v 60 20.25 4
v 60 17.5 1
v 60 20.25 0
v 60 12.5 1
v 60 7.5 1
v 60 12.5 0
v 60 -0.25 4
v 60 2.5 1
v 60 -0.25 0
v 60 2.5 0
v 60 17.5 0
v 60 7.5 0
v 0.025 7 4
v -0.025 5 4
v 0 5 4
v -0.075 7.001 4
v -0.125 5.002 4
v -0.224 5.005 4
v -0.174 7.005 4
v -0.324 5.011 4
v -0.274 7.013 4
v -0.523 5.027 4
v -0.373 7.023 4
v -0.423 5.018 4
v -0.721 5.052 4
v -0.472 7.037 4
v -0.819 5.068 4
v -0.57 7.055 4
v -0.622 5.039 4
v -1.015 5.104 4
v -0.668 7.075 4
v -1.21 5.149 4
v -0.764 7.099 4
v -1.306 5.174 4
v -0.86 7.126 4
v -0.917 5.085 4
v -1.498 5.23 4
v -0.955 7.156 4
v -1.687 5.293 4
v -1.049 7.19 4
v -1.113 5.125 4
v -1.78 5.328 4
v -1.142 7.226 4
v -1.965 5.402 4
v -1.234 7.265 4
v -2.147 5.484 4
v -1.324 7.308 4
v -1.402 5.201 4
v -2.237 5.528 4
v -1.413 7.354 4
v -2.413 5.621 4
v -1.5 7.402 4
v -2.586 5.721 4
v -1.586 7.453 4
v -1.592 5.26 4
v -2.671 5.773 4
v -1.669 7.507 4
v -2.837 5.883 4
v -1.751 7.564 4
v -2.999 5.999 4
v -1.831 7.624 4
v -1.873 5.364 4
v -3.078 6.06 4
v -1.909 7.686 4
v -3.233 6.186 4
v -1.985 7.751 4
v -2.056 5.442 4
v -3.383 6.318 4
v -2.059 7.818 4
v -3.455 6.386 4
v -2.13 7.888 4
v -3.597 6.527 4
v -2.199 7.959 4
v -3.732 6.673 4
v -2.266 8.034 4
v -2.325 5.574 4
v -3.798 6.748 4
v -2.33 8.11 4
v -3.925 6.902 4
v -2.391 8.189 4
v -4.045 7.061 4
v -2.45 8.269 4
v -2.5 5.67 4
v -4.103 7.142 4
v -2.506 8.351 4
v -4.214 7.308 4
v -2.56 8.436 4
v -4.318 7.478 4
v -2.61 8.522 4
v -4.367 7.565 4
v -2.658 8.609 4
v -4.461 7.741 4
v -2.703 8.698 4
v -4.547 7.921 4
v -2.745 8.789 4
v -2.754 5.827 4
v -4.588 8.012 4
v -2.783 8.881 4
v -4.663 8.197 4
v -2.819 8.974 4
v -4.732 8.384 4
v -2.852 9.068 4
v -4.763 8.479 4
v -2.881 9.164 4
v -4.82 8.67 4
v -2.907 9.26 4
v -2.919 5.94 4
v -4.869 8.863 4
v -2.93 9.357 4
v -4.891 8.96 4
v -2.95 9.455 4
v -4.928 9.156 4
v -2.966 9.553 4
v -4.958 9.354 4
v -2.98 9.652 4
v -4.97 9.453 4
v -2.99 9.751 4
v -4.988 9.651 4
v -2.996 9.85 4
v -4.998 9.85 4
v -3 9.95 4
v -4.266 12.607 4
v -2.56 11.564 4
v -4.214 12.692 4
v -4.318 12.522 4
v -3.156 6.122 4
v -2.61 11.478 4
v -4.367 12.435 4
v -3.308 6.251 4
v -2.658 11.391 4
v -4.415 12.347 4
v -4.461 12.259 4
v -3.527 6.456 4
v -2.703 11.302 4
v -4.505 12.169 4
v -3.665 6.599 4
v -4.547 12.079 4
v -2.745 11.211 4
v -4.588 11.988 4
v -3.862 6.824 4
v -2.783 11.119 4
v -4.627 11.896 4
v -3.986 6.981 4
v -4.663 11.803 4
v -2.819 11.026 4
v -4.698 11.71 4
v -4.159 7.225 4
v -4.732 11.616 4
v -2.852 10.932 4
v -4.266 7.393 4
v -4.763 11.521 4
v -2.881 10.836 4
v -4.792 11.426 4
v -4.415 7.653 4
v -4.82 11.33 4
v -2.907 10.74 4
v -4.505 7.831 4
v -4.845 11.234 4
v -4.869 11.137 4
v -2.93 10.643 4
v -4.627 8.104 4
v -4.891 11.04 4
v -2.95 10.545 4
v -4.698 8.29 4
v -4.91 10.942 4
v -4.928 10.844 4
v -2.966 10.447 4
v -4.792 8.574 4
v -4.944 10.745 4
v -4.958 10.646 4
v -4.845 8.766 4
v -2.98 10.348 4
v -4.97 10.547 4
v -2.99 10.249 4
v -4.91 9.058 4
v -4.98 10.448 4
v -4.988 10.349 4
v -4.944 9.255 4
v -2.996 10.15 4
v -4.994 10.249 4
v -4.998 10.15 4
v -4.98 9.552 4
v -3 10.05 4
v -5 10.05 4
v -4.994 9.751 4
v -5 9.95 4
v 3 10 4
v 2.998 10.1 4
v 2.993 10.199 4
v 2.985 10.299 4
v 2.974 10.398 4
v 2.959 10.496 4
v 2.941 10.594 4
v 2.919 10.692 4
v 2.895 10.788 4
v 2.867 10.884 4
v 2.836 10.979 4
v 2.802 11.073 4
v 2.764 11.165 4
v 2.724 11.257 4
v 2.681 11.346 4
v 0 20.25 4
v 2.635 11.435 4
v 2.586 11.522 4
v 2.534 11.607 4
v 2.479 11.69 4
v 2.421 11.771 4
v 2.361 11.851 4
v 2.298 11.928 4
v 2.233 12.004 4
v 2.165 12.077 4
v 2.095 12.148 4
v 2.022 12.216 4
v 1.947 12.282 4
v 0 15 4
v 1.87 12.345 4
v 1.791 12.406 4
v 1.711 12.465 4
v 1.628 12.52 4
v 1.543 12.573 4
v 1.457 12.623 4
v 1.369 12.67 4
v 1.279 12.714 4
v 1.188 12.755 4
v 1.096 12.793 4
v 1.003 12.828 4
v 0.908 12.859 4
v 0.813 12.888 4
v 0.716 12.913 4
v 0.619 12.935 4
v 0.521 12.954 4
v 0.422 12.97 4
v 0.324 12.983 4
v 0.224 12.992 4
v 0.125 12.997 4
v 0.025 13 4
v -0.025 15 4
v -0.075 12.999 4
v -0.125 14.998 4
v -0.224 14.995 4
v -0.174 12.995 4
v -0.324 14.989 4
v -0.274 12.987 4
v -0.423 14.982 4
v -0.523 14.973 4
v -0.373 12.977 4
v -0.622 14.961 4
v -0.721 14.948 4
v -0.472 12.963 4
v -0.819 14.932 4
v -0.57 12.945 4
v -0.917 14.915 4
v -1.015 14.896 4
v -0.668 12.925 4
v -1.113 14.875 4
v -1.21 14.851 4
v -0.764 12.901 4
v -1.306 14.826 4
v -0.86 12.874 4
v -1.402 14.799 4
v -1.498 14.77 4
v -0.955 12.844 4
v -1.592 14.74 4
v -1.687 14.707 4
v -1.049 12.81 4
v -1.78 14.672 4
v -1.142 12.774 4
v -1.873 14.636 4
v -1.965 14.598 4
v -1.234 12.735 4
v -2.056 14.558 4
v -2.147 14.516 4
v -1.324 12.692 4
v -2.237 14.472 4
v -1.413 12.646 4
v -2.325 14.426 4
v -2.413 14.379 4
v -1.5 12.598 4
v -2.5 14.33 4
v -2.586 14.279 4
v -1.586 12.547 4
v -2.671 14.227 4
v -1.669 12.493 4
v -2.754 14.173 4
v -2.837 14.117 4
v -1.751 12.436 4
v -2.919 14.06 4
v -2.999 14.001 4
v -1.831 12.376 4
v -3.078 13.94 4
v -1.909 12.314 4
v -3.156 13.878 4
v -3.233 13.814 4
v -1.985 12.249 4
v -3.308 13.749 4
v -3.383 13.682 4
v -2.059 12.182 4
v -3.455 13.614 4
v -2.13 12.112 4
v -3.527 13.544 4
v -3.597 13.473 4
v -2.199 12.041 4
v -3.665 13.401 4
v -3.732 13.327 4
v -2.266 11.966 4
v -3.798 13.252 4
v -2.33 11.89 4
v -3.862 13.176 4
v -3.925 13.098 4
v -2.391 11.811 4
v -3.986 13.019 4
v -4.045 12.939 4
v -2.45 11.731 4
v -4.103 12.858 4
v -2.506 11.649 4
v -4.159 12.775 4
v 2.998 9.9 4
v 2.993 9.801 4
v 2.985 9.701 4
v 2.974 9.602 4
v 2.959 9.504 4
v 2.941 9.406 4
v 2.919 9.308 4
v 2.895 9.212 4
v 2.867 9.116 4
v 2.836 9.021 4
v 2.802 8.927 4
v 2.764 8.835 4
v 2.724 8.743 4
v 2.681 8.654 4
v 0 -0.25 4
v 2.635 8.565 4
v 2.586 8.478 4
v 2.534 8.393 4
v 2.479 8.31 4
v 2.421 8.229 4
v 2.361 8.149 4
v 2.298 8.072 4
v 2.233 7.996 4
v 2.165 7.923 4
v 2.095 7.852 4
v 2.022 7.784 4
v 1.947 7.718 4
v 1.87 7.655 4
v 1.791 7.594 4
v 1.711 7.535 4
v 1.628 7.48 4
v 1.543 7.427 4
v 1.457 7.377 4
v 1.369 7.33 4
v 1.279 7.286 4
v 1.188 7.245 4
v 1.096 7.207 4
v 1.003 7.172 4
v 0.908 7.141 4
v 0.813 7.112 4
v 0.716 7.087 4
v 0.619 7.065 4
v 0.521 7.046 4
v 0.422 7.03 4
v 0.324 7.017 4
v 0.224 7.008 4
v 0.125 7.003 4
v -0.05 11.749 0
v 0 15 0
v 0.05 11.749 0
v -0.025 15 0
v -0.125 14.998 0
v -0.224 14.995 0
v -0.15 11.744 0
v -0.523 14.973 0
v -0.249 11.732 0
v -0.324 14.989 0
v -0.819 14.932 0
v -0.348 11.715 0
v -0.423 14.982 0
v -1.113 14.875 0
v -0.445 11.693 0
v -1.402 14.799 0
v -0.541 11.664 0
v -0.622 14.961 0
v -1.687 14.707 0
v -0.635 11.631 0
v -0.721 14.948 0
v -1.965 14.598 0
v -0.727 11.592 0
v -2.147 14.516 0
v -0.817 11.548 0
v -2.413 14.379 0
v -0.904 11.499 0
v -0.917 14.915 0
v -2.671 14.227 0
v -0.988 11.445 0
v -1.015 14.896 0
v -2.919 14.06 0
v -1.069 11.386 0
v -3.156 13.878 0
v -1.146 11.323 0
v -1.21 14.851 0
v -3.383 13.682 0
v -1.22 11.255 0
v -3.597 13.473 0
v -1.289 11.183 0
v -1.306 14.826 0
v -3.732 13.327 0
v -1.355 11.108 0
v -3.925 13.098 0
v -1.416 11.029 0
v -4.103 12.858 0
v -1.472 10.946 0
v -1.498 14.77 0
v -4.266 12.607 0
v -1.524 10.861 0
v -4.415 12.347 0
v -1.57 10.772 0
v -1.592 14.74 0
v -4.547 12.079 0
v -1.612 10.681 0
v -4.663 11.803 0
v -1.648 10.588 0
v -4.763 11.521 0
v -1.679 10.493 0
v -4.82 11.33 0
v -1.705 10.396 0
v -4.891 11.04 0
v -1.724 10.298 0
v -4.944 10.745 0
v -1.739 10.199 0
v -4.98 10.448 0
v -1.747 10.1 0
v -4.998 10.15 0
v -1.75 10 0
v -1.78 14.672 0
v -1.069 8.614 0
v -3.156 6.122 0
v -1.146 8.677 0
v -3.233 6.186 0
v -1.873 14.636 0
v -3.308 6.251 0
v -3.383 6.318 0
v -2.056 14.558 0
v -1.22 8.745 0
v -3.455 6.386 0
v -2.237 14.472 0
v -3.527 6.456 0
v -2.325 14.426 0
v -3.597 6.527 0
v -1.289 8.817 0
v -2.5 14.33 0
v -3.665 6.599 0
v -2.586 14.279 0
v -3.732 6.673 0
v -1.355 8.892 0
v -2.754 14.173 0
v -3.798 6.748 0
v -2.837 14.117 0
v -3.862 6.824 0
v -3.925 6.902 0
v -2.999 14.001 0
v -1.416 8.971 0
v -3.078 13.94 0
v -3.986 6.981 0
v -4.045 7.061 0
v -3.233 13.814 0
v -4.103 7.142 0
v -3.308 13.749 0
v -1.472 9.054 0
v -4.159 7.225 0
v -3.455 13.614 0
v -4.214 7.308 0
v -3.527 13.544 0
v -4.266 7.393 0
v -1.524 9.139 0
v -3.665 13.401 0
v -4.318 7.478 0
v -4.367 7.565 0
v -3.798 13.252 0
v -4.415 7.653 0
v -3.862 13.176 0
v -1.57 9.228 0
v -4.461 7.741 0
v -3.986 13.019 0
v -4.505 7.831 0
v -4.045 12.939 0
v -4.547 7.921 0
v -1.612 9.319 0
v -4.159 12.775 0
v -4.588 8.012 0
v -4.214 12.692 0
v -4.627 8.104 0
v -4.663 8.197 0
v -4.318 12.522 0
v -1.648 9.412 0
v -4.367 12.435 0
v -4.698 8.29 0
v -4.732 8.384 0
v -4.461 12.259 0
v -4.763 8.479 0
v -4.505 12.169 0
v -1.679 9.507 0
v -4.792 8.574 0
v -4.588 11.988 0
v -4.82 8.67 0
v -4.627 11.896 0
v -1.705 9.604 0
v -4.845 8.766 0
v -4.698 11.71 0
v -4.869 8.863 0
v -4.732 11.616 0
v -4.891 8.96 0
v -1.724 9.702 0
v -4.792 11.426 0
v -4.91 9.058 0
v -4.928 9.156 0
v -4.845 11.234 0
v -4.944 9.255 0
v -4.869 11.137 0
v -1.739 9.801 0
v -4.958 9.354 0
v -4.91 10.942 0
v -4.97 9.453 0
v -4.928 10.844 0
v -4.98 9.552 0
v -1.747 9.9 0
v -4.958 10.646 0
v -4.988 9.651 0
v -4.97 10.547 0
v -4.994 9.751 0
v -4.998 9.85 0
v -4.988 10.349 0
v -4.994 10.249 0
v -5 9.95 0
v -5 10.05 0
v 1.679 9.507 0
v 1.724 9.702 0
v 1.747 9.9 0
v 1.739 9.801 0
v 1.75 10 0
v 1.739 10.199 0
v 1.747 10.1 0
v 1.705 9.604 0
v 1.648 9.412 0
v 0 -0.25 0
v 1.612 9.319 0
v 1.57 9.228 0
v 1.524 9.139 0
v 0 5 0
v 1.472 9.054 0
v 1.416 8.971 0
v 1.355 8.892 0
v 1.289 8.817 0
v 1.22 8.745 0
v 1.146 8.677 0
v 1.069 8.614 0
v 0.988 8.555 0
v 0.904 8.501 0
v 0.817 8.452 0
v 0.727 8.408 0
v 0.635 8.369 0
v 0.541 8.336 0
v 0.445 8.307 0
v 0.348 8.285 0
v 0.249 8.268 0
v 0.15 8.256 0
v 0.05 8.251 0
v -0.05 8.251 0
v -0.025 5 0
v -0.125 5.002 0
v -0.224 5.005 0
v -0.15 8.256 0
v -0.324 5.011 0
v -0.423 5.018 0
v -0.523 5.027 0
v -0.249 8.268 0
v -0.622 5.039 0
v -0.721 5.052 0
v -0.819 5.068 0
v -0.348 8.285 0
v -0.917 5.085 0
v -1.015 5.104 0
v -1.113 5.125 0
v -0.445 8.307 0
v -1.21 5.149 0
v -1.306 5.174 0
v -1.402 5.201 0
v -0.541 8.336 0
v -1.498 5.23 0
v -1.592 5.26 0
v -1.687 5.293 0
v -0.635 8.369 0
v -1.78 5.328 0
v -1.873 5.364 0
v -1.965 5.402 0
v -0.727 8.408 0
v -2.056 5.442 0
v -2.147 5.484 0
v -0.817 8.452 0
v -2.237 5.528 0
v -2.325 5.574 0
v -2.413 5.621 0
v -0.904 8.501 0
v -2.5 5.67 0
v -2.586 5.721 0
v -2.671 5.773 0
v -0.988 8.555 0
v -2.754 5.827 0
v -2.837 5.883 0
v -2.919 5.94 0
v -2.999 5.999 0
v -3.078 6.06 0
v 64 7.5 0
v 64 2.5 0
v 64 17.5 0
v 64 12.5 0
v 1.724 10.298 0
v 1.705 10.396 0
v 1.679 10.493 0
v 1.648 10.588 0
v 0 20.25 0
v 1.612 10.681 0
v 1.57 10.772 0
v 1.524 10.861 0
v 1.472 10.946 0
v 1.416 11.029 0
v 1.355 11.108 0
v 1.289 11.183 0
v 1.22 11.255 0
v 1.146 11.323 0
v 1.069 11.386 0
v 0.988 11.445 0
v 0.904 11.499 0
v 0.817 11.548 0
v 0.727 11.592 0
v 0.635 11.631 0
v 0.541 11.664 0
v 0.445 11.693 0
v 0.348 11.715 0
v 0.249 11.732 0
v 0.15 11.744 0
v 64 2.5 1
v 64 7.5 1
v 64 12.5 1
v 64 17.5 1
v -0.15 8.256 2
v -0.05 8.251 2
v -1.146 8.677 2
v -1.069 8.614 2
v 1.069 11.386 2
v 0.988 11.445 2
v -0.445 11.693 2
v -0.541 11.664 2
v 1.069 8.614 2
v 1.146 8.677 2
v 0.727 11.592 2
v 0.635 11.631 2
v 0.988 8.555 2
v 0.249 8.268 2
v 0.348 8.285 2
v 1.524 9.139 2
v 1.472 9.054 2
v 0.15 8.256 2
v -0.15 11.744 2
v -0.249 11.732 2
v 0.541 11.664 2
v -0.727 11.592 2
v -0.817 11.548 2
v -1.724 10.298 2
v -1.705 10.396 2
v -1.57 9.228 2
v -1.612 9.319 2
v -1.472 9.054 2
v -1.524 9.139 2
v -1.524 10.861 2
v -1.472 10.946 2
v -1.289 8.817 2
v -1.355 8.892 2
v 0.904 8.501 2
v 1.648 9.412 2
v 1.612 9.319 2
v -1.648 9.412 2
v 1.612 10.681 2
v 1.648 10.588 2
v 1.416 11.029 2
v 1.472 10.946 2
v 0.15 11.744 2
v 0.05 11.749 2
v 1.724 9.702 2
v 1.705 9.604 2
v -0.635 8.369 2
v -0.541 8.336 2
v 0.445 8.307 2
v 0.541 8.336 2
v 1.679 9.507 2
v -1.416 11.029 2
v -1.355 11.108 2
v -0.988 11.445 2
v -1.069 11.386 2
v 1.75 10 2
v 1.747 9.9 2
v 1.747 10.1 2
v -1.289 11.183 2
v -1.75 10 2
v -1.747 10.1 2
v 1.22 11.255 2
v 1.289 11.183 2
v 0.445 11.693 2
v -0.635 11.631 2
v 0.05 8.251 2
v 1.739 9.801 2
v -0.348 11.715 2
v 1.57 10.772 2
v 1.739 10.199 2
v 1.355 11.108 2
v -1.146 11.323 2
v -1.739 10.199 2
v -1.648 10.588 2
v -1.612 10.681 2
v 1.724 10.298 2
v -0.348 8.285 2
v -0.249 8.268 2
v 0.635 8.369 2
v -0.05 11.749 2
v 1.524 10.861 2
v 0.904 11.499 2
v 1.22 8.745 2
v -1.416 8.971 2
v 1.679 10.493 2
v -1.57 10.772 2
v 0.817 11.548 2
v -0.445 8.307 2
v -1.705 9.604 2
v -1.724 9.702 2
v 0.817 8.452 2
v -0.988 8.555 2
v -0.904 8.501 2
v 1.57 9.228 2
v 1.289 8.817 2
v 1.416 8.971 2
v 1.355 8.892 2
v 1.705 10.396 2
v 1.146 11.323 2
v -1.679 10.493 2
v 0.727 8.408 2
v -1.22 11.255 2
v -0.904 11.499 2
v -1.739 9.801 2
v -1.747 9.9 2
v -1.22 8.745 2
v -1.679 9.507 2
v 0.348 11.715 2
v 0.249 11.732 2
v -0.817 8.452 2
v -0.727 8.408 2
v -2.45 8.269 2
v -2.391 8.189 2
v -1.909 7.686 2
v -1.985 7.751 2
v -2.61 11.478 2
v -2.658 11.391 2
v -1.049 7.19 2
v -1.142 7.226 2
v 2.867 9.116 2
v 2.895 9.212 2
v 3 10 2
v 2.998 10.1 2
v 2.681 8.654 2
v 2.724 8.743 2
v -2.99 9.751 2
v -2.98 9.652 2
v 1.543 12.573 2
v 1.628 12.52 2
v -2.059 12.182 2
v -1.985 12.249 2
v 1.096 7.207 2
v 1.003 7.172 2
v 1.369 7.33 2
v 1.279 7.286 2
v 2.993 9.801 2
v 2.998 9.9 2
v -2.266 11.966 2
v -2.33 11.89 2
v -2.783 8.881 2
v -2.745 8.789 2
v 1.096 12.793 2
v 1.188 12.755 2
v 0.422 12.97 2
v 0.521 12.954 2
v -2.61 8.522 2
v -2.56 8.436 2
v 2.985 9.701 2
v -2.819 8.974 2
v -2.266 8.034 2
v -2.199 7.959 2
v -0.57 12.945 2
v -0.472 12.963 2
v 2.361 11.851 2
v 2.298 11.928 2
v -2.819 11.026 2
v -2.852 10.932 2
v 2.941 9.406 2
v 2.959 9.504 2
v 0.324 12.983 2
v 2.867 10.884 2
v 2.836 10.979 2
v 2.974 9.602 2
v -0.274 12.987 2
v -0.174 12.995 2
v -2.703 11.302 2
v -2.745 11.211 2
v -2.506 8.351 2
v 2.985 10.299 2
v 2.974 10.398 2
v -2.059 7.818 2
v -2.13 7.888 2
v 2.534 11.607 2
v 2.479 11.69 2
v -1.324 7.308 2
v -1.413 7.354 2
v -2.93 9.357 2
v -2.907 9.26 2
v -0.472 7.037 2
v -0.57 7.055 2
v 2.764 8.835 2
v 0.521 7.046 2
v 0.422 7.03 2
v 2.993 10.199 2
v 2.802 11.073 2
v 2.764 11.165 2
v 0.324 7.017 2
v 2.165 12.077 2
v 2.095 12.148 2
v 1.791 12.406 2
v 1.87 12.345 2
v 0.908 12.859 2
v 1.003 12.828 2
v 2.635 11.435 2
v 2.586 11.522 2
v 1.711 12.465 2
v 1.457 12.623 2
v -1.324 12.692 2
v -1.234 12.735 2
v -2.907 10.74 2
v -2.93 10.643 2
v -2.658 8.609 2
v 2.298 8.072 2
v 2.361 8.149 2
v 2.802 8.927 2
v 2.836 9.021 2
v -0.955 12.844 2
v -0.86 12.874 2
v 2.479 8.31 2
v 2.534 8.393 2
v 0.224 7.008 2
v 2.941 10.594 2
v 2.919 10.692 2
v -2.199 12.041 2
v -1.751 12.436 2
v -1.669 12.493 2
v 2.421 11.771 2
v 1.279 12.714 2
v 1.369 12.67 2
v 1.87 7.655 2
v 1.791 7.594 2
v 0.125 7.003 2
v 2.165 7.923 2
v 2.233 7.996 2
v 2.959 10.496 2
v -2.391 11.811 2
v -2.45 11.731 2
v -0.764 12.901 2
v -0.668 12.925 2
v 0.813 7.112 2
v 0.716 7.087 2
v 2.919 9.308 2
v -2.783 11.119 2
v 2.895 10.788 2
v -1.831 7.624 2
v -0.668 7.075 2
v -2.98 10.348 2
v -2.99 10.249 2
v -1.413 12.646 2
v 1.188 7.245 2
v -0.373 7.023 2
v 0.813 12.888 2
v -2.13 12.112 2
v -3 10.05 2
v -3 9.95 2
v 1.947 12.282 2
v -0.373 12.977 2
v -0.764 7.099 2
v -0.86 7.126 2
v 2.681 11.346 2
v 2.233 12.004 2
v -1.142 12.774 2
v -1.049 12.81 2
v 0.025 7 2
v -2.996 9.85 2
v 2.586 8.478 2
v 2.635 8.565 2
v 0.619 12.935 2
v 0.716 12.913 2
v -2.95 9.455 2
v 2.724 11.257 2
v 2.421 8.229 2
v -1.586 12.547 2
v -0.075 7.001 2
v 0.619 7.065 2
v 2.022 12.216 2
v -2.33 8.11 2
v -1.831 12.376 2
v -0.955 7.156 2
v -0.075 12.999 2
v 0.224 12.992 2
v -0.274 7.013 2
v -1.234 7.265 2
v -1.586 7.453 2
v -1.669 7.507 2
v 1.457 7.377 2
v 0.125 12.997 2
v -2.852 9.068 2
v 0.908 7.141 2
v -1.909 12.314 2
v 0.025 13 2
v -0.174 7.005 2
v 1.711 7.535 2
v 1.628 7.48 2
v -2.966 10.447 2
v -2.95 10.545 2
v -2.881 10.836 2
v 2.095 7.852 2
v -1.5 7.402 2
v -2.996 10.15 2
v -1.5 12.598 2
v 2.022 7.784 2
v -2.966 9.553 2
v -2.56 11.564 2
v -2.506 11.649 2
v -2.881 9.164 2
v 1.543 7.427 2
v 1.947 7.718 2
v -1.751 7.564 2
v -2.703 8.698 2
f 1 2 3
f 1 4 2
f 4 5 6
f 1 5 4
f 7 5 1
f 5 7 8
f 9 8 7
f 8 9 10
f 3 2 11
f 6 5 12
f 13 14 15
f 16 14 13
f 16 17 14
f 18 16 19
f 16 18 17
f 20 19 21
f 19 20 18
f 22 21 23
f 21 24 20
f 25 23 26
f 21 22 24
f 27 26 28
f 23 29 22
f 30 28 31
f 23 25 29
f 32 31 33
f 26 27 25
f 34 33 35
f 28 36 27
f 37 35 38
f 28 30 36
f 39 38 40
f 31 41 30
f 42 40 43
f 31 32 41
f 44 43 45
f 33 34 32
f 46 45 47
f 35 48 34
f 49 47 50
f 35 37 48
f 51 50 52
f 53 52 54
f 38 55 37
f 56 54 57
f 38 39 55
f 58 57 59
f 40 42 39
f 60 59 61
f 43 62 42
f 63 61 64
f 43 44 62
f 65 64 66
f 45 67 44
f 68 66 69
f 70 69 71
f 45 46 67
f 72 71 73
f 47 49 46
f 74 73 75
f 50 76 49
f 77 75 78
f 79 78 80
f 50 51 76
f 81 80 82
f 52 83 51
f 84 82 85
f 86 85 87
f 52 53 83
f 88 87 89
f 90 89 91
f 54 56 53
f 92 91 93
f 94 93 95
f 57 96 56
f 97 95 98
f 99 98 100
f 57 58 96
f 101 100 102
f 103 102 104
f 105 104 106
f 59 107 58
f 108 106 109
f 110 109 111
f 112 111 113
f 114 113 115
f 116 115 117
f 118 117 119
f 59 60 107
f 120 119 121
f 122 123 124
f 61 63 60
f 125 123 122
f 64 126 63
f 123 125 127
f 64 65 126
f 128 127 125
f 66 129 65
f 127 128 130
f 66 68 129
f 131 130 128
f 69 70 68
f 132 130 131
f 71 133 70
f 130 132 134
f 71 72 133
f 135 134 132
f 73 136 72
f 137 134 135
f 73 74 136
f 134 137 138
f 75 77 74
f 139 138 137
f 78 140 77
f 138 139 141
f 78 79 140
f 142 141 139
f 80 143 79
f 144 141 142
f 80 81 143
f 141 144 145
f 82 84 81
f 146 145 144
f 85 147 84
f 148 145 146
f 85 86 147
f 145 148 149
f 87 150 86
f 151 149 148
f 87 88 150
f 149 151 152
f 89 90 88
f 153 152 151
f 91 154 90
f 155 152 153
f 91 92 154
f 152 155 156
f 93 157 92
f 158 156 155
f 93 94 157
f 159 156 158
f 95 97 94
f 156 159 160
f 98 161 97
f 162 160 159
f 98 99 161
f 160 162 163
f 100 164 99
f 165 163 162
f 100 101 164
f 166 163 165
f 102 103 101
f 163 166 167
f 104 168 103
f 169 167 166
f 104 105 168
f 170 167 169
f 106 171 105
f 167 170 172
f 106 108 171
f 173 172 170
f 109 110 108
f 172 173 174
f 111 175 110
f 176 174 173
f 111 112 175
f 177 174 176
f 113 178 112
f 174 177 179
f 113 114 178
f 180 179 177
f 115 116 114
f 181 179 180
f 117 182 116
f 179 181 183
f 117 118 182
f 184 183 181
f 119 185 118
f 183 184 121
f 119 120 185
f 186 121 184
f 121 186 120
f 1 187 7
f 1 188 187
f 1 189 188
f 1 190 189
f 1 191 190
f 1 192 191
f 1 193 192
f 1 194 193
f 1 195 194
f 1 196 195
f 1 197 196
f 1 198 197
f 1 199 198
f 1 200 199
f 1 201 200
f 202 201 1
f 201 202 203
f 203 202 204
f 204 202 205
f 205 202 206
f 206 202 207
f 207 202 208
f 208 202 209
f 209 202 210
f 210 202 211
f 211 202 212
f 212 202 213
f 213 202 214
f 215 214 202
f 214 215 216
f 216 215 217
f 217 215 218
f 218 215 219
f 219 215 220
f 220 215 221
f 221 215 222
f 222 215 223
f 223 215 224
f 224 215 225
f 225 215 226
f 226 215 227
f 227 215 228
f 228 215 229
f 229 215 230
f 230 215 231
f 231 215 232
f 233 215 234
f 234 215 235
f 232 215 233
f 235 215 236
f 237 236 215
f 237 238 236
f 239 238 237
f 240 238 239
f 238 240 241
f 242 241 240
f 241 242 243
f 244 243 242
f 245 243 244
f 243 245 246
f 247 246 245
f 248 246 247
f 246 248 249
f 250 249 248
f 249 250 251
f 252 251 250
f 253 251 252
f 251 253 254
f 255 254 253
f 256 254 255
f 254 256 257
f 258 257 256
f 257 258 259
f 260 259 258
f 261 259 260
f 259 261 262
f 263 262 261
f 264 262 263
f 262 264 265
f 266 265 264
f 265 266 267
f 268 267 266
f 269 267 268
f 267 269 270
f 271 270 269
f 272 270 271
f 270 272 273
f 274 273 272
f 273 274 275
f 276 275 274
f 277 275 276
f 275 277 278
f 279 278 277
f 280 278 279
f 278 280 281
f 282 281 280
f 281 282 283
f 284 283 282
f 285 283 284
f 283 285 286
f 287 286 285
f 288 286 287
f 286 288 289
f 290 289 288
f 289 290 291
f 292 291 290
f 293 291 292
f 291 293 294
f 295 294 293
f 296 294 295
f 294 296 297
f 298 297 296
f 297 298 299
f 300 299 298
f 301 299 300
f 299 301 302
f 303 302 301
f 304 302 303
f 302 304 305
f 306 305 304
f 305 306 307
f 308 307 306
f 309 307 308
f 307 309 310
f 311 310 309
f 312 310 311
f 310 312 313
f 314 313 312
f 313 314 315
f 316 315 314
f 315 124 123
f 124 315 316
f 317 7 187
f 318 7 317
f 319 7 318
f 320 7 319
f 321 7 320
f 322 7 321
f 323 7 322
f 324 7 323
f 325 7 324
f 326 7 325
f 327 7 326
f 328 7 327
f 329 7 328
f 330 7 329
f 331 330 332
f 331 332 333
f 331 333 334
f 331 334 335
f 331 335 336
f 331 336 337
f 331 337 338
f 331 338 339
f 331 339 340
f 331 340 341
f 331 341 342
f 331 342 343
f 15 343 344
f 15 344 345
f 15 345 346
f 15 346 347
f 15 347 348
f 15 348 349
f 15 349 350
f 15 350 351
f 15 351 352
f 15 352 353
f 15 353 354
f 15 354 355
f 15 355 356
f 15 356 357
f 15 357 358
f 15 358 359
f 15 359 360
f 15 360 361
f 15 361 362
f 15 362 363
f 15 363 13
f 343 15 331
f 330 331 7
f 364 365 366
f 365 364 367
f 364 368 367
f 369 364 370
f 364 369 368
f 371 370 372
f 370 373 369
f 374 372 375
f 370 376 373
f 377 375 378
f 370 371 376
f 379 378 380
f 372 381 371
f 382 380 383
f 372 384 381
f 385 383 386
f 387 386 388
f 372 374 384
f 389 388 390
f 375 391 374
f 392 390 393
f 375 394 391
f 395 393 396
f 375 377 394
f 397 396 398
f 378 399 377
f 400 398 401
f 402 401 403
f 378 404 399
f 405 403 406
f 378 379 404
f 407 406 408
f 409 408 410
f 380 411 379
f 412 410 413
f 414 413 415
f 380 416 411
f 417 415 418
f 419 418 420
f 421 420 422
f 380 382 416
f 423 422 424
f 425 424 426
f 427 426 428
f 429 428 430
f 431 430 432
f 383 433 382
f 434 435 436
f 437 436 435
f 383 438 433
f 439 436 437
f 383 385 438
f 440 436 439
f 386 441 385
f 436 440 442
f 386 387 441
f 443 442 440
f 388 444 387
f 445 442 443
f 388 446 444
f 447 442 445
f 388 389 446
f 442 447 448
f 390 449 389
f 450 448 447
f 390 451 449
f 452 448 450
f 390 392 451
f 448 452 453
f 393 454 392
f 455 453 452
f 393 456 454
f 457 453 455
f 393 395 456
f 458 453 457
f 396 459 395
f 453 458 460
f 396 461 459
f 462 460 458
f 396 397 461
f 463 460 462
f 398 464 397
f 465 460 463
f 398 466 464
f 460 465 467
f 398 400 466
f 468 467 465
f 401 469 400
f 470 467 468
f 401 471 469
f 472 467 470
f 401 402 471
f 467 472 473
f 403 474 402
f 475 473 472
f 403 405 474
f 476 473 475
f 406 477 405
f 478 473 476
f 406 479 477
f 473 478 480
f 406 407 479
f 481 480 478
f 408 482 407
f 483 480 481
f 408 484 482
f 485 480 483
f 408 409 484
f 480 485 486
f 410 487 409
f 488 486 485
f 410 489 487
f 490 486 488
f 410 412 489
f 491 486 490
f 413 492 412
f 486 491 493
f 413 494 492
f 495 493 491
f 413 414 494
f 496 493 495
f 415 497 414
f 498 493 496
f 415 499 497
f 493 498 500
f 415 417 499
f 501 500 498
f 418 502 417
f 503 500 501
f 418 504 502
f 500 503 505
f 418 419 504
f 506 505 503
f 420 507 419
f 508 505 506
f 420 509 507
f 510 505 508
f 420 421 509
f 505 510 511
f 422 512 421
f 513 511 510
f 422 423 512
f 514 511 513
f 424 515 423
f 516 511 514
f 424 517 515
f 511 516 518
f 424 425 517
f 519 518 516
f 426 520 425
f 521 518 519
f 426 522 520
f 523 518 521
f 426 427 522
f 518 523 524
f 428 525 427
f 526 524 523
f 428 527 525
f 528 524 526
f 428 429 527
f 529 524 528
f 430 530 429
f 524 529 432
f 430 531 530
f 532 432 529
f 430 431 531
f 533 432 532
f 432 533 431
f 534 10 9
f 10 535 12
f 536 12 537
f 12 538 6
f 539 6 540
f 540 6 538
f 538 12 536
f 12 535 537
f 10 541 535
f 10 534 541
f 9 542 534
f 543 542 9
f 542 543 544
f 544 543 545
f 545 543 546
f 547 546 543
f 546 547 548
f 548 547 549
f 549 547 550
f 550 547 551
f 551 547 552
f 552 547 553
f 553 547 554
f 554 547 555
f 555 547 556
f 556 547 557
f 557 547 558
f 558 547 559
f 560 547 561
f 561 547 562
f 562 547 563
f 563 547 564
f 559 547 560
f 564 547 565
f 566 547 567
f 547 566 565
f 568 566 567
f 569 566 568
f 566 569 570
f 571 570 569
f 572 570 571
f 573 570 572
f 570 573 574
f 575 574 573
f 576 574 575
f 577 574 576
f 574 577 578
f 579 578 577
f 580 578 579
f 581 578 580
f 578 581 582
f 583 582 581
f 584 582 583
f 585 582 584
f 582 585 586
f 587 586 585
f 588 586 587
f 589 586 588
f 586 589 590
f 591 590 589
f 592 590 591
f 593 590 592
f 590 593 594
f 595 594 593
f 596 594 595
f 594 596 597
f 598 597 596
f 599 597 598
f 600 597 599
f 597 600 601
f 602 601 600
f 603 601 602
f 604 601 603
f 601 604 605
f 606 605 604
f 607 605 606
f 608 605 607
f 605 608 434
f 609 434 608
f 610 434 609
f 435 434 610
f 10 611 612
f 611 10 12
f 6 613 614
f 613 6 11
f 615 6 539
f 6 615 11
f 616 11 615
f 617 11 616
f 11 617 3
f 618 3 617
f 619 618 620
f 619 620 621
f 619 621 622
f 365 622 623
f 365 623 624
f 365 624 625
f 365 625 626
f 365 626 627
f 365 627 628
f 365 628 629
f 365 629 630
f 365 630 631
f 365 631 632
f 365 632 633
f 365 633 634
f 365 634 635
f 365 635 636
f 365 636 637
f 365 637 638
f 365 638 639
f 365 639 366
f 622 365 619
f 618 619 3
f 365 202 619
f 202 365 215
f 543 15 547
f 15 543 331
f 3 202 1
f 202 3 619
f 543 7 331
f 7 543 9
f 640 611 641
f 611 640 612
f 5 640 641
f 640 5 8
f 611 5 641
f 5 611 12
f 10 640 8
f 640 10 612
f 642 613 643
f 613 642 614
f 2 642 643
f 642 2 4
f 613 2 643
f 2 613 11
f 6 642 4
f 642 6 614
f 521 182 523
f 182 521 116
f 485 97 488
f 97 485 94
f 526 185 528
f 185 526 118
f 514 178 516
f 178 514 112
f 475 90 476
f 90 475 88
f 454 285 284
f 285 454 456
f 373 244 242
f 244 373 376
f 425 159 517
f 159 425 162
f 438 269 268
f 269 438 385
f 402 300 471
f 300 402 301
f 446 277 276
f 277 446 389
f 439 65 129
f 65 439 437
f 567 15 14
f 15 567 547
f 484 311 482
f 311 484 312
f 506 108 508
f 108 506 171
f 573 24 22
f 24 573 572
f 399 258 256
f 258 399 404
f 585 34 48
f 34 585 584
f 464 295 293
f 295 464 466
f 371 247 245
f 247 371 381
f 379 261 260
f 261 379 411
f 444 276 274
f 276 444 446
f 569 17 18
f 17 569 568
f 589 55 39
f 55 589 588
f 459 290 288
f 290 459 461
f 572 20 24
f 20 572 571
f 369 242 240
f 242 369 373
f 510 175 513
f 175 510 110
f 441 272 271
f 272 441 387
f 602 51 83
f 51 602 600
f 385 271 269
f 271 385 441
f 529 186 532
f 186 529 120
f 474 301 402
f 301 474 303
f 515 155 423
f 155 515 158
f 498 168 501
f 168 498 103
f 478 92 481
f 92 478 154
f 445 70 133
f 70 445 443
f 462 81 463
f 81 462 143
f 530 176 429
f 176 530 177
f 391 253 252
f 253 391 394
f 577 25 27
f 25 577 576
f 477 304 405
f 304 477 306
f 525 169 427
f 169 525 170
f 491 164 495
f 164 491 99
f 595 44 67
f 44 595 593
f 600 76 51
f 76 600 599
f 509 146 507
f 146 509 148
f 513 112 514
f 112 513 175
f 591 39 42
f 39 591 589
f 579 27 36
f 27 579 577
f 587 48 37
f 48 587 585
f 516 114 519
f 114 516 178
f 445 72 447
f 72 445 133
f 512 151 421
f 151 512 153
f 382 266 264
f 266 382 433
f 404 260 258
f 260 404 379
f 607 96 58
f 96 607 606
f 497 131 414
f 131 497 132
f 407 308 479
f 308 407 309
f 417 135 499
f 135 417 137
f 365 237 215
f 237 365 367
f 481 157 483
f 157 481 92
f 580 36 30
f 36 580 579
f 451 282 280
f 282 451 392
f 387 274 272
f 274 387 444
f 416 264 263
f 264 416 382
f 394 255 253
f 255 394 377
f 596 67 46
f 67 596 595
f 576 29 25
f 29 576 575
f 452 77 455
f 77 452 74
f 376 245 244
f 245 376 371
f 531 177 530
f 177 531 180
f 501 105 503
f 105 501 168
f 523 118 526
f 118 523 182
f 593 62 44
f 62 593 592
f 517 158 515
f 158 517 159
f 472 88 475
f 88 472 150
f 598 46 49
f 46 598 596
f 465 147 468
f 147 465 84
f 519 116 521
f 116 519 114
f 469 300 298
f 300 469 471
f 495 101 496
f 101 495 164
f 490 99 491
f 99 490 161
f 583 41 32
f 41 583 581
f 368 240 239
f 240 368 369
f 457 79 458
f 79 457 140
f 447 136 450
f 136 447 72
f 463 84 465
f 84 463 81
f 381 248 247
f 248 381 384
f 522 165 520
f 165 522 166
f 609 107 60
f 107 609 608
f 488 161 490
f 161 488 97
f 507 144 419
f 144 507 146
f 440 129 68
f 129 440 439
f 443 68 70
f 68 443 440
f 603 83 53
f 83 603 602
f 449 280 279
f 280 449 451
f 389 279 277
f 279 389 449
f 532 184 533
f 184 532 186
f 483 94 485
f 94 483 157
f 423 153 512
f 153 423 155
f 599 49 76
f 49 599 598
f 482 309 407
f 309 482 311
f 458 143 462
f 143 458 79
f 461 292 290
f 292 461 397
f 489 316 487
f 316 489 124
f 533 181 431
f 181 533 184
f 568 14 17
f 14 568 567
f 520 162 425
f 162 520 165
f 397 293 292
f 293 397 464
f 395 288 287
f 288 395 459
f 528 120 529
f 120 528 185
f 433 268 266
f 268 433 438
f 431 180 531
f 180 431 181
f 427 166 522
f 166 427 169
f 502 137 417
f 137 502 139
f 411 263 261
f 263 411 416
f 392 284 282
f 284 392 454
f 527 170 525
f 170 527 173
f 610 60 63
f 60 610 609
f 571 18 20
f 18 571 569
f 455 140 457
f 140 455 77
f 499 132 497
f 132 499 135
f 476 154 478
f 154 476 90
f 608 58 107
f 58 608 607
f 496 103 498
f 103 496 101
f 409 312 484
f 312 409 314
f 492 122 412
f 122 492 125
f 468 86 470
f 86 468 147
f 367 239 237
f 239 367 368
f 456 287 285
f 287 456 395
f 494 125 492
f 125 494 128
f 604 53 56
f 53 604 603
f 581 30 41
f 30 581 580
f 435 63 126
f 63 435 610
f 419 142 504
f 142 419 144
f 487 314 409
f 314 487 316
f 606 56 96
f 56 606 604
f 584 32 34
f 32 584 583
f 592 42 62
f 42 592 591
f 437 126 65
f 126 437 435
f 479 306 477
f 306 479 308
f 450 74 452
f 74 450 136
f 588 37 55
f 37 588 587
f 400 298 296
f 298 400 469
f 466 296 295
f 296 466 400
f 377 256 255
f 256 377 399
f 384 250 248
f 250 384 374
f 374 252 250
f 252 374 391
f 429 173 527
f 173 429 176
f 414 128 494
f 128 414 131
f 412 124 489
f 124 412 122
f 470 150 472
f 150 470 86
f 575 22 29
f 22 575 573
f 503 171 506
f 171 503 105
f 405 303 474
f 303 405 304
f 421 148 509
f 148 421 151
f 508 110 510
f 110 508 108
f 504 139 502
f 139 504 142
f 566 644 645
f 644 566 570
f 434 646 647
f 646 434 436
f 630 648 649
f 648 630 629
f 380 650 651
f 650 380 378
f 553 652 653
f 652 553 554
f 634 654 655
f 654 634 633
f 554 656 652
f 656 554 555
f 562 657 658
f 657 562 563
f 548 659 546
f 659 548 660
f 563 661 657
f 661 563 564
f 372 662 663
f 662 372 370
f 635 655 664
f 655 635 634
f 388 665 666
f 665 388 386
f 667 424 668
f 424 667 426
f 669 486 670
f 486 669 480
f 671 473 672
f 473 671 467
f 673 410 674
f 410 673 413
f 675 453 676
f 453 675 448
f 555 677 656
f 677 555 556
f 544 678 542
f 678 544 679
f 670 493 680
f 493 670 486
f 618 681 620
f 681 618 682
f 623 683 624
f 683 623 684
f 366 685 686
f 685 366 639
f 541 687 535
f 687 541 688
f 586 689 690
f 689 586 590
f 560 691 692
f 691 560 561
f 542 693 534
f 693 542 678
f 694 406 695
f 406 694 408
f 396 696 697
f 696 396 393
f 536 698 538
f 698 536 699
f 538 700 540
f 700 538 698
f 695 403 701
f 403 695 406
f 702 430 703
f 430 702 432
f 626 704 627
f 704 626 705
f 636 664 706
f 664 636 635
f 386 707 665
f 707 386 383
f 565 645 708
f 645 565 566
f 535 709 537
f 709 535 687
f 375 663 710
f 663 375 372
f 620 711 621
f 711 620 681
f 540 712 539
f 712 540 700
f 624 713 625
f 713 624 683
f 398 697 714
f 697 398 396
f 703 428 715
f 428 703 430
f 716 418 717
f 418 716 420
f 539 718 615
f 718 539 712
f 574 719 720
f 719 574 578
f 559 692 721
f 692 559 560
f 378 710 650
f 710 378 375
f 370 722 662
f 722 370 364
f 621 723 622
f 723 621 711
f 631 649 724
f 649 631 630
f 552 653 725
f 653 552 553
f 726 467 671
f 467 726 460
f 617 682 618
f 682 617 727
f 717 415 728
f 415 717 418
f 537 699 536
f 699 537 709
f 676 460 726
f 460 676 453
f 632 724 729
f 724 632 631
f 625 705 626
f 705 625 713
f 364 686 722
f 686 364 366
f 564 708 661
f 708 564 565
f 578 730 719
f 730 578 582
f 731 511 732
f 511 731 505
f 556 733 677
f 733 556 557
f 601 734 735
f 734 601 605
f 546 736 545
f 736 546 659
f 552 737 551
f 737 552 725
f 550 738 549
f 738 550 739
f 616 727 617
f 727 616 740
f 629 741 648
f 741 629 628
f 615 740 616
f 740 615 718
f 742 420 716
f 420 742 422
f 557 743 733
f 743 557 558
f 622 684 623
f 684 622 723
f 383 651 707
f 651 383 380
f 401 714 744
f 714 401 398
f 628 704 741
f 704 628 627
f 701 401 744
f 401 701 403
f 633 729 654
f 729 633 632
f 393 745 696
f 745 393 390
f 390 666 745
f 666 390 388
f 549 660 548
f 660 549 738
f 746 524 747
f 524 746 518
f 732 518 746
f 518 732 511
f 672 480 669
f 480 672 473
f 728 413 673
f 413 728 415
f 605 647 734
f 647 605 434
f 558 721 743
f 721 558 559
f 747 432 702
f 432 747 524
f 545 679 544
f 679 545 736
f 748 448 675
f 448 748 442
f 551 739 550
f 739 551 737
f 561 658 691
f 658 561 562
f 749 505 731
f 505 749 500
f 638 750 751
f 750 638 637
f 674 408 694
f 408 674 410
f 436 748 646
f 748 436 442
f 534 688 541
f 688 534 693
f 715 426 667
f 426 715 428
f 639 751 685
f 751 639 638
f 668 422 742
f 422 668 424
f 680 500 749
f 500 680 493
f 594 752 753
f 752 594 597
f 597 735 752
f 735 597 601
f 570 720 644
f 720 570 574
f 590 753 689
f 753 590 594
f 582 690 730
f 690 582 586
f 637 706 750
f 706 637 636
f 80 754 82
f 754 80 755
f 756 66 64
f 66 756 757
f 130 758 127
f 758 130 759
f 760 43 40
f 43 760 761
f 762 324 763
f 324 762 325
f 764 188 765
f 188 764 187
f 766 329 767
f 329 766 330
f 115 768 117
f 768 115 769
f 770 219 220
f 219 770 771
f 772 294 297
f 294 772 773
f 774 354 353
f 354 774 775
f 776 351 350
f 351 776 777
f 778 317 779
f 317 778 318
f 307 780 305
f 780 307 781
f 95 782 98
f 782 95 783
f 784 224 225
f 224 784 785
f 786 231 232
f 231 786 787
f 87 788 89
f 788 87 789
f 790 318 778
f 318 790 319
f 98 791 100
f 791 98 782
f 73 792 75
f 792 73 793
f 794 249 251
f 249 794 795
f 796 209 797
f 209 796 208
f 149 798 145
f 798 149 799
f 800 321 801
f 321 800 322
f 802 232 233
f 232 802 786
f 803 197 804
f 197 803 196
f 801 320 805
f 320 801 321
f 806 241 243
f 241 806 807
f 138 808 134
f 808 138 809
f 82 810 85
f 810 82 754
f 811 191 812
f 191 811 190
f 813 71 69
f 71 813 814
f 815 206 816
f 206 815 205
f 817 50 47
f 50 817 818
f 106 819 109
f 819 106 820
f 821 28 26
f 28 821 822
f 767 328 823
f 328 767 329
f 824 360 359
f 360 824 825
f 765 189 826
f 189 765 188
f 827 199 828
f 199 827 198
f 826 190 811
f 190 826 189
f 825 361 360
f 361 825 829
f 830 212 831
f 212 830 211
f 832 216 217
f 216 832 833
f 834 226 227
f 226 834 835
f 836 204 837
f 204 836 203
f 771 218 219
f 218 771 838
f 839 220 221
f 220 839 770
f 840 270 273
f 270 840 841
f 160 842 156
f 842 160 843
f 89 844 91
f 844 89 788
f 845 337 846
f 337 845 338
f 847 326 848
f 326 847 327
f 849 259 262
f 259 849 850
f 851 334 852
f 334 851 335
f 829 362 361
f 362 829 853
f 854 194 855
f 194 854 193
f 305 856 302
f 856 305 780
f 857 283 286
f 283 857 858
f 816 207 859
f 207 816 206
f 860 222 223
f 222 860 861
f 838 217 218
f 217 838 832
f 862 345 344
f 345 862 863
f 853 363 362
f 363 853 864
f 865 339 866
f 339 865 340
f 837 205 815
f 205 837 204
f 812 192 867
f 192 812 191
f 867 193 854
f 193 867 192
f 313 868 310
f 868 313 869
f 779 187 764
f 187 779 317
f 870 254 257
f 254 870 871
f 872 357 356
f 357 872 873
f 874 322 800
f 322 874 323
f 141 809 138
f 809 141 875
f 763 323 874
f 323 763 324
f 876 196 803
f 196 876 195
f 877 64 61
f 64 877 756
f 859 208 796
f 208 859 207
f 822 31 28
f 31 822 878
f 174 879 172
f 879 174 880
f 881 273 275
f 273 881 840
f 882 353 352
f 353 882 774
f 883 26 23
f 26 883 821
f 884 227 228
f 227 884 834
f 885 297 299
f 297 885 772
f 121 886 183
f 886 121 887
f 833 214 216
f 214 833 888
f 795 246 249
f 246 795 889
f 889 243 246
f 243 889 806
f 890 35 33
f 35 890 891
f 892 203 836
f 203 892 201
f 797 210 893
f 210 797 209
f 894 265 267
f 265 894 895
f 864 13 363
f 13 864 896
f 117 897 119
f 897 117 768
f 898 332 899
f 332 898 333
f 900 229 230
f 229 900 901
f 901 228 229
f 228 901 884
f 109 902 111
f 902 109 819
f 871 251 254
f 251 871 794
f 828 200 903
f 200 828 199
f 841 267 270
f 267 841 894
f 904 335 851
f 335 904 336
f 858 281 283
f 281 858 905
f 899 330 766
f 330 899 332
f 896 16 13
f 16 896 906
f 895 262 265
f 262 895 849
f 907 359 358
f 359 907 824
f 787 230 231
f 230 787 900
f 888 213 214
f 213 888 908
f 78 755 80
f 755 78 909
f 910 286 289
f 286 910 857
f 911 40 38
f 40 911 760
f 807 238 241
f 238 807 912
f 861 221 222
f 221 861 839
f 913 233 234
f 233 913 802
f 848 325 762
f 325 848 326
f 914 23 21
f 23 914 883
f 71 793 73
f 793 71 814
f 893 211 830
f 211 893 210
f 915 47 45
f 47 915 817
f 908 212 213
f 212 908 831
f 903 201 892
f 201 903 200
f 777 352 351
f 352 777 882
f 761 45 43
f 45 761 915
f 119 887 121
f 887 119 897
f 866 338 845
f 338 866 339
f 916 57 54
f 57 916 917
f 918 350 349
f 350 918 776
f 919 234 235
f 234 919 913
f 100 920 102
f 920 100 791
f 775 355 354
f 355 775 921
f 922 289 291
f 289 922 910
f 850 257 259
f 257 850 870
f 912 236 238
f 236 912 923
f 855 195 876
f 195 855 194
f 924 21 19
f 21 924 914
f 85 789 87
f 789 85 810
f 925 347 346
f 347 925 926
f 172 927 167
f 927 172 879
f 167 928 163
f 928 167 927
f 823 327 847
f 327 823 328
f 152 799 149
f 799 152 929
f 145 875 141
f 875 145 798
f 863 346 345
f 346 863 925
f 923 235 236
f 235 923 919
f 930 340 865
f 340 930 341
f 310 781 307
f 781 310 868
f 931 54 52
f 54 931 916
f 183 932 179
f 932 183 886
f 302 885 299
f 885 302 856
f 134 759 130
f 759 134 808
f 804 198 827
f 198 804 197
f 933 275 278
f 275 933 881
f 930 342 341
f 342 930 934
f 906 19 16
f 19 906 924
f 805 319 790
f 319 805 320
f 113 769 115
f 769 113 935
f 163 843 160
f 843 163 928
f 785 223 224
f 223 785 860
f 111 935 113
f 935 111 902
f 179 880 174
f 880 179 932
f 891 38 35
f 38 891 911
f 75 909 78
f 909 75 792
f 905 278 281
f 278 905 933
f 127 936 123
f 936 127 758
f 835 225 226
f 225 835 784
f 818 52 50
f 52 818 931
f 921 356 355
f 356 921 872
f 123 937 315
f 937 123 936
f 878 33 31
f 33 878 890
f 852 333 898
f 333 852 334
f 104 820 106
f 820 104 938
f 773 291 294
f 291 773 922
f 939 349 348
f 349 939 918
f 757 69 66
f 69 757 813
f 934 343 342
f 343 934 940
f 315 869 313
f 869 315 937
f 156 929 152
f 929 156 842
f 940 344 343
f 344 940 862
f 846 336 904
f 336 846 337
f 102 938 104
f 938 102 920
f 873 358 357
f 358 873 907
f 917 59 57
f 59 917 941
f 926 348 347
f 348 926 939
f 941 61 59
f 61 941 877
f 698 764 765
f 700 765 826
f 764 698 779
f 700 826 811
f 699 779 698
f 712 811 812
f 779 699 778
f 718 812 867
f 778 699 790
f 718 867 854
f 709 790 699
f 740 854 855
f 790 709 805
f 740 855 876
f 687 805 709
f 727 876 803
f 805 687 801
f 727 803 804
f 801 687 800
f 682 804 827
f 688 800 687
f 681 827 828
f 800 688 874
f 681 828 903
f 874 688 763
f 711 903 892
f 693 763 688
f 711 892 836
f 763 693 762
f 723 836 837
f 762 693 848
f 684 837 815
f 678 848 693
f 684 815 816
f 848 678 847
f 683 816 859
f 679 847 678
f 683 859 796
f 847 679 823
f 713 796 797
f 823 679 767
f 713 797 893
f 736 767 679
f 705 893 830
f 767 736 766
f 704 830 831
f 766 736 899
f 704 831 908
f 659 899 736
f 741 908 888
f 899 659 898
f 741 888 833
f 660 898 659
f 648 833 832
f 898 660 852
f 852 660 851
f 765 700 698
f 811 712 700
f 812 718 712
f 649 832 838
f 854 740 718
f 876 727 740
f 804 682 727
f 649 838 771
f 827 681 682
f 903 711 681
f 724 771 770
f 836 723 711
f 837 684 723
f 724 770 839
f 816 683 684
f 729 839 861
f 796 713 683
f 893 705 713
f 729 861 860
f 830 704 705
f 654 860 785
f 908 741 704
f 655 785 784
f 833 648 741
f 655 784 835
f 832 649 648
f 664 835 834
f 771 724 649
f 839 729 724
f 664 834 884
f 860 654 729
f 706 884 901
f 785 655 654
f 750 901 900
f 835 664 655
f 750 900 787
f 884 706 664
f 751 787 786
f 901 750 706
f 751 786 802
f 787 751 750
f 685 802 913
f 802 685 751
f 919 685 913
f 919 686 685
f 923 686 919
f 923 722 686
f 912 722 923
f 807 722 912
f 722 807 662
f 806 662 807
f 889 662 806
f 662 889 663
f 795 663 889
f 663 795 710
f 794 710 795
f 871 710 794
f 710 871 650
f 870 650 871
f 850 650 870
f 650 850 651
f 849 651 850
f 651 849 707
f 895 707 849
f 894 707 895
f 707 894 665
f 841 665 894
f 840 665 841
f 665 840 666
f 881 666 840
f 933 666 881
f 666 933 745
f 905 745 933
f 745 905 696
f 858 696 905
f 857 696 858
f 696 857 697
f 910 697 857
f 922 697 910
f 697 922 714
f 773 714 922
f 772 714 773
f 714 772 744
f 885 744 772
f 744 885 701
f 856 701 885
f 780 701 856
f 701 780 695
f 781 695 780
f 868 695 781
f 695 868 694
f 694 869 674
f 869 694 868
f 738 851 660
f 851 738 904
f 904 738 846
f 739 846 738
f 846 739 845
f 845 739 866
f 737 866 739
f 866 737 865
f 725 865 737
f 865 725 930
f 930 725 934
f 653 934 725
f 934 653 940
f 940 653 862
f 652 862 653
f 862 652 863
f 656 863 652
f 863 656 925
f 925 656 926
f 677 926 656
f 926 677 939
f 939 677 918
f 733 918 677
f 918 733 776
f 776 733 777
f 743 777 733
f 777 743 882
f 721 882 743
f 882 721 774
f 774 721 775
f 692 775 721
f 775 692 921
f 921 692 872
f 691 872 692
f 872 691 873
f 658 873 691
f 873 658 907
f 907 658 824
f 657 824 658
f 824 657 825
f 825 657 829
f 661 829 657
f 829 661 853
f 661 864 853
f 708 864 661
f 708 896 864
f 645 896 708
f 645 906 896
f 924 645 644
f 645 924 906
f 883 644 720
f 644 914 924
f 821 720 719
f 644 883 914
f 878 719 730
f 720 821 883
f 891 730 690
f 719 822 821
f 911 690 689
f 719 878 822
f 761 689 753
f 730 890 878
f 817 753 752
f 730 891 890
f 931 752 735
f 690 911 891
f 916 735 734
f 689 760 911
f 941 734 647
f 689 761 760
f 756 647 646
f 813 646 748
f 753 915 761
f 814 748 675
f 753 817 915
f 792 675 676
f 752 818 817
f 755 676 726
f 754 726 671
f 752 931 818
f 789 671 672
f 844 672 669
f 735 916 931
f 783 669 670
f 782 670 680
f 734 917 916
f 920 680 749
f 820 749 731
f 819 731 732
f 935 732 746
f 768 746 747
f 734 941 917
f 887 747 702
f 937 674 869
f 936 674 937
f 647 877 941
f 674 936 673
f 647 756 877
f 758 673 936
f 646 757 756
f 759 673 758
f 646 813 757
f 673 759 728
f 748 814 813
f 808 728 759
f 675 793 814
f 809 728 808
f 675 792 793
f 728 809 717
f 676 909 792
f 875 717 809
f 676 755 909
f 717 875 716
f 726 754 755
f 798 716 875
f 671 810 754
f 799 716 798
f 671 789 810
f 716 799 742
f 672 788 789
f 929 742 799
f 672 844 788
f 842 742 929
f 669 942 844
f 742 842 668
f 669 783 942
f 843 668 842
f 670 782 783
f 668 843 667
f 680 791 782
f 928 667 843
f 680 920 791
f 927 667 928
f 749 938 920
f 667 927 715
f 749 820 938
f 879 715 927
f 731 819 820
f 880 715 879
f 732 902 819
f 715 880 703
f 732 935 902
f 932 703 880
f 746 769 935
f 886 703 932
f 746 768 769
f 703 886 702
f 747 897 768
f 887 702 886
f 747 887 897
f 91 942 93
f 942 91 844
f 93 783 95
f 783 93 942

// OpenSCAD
$fa = .1;
$fs = .1;
difference(){
    union(){
        translate([0,-.25,0]) cube([60,20.5,4]);
        translate([59,17.5-15,0]) cube([5,5,1]);
        translate([59,17.5-5,0]) cube([5,5,1]);
        translate([0,10,0]) cylinder(h=4, r=5);
    }
    translate([0,10,-1]) cylinder(h=6, r=3.5/2);
    translate([0,10,2]) cylinder(h=6, r=3);
}
